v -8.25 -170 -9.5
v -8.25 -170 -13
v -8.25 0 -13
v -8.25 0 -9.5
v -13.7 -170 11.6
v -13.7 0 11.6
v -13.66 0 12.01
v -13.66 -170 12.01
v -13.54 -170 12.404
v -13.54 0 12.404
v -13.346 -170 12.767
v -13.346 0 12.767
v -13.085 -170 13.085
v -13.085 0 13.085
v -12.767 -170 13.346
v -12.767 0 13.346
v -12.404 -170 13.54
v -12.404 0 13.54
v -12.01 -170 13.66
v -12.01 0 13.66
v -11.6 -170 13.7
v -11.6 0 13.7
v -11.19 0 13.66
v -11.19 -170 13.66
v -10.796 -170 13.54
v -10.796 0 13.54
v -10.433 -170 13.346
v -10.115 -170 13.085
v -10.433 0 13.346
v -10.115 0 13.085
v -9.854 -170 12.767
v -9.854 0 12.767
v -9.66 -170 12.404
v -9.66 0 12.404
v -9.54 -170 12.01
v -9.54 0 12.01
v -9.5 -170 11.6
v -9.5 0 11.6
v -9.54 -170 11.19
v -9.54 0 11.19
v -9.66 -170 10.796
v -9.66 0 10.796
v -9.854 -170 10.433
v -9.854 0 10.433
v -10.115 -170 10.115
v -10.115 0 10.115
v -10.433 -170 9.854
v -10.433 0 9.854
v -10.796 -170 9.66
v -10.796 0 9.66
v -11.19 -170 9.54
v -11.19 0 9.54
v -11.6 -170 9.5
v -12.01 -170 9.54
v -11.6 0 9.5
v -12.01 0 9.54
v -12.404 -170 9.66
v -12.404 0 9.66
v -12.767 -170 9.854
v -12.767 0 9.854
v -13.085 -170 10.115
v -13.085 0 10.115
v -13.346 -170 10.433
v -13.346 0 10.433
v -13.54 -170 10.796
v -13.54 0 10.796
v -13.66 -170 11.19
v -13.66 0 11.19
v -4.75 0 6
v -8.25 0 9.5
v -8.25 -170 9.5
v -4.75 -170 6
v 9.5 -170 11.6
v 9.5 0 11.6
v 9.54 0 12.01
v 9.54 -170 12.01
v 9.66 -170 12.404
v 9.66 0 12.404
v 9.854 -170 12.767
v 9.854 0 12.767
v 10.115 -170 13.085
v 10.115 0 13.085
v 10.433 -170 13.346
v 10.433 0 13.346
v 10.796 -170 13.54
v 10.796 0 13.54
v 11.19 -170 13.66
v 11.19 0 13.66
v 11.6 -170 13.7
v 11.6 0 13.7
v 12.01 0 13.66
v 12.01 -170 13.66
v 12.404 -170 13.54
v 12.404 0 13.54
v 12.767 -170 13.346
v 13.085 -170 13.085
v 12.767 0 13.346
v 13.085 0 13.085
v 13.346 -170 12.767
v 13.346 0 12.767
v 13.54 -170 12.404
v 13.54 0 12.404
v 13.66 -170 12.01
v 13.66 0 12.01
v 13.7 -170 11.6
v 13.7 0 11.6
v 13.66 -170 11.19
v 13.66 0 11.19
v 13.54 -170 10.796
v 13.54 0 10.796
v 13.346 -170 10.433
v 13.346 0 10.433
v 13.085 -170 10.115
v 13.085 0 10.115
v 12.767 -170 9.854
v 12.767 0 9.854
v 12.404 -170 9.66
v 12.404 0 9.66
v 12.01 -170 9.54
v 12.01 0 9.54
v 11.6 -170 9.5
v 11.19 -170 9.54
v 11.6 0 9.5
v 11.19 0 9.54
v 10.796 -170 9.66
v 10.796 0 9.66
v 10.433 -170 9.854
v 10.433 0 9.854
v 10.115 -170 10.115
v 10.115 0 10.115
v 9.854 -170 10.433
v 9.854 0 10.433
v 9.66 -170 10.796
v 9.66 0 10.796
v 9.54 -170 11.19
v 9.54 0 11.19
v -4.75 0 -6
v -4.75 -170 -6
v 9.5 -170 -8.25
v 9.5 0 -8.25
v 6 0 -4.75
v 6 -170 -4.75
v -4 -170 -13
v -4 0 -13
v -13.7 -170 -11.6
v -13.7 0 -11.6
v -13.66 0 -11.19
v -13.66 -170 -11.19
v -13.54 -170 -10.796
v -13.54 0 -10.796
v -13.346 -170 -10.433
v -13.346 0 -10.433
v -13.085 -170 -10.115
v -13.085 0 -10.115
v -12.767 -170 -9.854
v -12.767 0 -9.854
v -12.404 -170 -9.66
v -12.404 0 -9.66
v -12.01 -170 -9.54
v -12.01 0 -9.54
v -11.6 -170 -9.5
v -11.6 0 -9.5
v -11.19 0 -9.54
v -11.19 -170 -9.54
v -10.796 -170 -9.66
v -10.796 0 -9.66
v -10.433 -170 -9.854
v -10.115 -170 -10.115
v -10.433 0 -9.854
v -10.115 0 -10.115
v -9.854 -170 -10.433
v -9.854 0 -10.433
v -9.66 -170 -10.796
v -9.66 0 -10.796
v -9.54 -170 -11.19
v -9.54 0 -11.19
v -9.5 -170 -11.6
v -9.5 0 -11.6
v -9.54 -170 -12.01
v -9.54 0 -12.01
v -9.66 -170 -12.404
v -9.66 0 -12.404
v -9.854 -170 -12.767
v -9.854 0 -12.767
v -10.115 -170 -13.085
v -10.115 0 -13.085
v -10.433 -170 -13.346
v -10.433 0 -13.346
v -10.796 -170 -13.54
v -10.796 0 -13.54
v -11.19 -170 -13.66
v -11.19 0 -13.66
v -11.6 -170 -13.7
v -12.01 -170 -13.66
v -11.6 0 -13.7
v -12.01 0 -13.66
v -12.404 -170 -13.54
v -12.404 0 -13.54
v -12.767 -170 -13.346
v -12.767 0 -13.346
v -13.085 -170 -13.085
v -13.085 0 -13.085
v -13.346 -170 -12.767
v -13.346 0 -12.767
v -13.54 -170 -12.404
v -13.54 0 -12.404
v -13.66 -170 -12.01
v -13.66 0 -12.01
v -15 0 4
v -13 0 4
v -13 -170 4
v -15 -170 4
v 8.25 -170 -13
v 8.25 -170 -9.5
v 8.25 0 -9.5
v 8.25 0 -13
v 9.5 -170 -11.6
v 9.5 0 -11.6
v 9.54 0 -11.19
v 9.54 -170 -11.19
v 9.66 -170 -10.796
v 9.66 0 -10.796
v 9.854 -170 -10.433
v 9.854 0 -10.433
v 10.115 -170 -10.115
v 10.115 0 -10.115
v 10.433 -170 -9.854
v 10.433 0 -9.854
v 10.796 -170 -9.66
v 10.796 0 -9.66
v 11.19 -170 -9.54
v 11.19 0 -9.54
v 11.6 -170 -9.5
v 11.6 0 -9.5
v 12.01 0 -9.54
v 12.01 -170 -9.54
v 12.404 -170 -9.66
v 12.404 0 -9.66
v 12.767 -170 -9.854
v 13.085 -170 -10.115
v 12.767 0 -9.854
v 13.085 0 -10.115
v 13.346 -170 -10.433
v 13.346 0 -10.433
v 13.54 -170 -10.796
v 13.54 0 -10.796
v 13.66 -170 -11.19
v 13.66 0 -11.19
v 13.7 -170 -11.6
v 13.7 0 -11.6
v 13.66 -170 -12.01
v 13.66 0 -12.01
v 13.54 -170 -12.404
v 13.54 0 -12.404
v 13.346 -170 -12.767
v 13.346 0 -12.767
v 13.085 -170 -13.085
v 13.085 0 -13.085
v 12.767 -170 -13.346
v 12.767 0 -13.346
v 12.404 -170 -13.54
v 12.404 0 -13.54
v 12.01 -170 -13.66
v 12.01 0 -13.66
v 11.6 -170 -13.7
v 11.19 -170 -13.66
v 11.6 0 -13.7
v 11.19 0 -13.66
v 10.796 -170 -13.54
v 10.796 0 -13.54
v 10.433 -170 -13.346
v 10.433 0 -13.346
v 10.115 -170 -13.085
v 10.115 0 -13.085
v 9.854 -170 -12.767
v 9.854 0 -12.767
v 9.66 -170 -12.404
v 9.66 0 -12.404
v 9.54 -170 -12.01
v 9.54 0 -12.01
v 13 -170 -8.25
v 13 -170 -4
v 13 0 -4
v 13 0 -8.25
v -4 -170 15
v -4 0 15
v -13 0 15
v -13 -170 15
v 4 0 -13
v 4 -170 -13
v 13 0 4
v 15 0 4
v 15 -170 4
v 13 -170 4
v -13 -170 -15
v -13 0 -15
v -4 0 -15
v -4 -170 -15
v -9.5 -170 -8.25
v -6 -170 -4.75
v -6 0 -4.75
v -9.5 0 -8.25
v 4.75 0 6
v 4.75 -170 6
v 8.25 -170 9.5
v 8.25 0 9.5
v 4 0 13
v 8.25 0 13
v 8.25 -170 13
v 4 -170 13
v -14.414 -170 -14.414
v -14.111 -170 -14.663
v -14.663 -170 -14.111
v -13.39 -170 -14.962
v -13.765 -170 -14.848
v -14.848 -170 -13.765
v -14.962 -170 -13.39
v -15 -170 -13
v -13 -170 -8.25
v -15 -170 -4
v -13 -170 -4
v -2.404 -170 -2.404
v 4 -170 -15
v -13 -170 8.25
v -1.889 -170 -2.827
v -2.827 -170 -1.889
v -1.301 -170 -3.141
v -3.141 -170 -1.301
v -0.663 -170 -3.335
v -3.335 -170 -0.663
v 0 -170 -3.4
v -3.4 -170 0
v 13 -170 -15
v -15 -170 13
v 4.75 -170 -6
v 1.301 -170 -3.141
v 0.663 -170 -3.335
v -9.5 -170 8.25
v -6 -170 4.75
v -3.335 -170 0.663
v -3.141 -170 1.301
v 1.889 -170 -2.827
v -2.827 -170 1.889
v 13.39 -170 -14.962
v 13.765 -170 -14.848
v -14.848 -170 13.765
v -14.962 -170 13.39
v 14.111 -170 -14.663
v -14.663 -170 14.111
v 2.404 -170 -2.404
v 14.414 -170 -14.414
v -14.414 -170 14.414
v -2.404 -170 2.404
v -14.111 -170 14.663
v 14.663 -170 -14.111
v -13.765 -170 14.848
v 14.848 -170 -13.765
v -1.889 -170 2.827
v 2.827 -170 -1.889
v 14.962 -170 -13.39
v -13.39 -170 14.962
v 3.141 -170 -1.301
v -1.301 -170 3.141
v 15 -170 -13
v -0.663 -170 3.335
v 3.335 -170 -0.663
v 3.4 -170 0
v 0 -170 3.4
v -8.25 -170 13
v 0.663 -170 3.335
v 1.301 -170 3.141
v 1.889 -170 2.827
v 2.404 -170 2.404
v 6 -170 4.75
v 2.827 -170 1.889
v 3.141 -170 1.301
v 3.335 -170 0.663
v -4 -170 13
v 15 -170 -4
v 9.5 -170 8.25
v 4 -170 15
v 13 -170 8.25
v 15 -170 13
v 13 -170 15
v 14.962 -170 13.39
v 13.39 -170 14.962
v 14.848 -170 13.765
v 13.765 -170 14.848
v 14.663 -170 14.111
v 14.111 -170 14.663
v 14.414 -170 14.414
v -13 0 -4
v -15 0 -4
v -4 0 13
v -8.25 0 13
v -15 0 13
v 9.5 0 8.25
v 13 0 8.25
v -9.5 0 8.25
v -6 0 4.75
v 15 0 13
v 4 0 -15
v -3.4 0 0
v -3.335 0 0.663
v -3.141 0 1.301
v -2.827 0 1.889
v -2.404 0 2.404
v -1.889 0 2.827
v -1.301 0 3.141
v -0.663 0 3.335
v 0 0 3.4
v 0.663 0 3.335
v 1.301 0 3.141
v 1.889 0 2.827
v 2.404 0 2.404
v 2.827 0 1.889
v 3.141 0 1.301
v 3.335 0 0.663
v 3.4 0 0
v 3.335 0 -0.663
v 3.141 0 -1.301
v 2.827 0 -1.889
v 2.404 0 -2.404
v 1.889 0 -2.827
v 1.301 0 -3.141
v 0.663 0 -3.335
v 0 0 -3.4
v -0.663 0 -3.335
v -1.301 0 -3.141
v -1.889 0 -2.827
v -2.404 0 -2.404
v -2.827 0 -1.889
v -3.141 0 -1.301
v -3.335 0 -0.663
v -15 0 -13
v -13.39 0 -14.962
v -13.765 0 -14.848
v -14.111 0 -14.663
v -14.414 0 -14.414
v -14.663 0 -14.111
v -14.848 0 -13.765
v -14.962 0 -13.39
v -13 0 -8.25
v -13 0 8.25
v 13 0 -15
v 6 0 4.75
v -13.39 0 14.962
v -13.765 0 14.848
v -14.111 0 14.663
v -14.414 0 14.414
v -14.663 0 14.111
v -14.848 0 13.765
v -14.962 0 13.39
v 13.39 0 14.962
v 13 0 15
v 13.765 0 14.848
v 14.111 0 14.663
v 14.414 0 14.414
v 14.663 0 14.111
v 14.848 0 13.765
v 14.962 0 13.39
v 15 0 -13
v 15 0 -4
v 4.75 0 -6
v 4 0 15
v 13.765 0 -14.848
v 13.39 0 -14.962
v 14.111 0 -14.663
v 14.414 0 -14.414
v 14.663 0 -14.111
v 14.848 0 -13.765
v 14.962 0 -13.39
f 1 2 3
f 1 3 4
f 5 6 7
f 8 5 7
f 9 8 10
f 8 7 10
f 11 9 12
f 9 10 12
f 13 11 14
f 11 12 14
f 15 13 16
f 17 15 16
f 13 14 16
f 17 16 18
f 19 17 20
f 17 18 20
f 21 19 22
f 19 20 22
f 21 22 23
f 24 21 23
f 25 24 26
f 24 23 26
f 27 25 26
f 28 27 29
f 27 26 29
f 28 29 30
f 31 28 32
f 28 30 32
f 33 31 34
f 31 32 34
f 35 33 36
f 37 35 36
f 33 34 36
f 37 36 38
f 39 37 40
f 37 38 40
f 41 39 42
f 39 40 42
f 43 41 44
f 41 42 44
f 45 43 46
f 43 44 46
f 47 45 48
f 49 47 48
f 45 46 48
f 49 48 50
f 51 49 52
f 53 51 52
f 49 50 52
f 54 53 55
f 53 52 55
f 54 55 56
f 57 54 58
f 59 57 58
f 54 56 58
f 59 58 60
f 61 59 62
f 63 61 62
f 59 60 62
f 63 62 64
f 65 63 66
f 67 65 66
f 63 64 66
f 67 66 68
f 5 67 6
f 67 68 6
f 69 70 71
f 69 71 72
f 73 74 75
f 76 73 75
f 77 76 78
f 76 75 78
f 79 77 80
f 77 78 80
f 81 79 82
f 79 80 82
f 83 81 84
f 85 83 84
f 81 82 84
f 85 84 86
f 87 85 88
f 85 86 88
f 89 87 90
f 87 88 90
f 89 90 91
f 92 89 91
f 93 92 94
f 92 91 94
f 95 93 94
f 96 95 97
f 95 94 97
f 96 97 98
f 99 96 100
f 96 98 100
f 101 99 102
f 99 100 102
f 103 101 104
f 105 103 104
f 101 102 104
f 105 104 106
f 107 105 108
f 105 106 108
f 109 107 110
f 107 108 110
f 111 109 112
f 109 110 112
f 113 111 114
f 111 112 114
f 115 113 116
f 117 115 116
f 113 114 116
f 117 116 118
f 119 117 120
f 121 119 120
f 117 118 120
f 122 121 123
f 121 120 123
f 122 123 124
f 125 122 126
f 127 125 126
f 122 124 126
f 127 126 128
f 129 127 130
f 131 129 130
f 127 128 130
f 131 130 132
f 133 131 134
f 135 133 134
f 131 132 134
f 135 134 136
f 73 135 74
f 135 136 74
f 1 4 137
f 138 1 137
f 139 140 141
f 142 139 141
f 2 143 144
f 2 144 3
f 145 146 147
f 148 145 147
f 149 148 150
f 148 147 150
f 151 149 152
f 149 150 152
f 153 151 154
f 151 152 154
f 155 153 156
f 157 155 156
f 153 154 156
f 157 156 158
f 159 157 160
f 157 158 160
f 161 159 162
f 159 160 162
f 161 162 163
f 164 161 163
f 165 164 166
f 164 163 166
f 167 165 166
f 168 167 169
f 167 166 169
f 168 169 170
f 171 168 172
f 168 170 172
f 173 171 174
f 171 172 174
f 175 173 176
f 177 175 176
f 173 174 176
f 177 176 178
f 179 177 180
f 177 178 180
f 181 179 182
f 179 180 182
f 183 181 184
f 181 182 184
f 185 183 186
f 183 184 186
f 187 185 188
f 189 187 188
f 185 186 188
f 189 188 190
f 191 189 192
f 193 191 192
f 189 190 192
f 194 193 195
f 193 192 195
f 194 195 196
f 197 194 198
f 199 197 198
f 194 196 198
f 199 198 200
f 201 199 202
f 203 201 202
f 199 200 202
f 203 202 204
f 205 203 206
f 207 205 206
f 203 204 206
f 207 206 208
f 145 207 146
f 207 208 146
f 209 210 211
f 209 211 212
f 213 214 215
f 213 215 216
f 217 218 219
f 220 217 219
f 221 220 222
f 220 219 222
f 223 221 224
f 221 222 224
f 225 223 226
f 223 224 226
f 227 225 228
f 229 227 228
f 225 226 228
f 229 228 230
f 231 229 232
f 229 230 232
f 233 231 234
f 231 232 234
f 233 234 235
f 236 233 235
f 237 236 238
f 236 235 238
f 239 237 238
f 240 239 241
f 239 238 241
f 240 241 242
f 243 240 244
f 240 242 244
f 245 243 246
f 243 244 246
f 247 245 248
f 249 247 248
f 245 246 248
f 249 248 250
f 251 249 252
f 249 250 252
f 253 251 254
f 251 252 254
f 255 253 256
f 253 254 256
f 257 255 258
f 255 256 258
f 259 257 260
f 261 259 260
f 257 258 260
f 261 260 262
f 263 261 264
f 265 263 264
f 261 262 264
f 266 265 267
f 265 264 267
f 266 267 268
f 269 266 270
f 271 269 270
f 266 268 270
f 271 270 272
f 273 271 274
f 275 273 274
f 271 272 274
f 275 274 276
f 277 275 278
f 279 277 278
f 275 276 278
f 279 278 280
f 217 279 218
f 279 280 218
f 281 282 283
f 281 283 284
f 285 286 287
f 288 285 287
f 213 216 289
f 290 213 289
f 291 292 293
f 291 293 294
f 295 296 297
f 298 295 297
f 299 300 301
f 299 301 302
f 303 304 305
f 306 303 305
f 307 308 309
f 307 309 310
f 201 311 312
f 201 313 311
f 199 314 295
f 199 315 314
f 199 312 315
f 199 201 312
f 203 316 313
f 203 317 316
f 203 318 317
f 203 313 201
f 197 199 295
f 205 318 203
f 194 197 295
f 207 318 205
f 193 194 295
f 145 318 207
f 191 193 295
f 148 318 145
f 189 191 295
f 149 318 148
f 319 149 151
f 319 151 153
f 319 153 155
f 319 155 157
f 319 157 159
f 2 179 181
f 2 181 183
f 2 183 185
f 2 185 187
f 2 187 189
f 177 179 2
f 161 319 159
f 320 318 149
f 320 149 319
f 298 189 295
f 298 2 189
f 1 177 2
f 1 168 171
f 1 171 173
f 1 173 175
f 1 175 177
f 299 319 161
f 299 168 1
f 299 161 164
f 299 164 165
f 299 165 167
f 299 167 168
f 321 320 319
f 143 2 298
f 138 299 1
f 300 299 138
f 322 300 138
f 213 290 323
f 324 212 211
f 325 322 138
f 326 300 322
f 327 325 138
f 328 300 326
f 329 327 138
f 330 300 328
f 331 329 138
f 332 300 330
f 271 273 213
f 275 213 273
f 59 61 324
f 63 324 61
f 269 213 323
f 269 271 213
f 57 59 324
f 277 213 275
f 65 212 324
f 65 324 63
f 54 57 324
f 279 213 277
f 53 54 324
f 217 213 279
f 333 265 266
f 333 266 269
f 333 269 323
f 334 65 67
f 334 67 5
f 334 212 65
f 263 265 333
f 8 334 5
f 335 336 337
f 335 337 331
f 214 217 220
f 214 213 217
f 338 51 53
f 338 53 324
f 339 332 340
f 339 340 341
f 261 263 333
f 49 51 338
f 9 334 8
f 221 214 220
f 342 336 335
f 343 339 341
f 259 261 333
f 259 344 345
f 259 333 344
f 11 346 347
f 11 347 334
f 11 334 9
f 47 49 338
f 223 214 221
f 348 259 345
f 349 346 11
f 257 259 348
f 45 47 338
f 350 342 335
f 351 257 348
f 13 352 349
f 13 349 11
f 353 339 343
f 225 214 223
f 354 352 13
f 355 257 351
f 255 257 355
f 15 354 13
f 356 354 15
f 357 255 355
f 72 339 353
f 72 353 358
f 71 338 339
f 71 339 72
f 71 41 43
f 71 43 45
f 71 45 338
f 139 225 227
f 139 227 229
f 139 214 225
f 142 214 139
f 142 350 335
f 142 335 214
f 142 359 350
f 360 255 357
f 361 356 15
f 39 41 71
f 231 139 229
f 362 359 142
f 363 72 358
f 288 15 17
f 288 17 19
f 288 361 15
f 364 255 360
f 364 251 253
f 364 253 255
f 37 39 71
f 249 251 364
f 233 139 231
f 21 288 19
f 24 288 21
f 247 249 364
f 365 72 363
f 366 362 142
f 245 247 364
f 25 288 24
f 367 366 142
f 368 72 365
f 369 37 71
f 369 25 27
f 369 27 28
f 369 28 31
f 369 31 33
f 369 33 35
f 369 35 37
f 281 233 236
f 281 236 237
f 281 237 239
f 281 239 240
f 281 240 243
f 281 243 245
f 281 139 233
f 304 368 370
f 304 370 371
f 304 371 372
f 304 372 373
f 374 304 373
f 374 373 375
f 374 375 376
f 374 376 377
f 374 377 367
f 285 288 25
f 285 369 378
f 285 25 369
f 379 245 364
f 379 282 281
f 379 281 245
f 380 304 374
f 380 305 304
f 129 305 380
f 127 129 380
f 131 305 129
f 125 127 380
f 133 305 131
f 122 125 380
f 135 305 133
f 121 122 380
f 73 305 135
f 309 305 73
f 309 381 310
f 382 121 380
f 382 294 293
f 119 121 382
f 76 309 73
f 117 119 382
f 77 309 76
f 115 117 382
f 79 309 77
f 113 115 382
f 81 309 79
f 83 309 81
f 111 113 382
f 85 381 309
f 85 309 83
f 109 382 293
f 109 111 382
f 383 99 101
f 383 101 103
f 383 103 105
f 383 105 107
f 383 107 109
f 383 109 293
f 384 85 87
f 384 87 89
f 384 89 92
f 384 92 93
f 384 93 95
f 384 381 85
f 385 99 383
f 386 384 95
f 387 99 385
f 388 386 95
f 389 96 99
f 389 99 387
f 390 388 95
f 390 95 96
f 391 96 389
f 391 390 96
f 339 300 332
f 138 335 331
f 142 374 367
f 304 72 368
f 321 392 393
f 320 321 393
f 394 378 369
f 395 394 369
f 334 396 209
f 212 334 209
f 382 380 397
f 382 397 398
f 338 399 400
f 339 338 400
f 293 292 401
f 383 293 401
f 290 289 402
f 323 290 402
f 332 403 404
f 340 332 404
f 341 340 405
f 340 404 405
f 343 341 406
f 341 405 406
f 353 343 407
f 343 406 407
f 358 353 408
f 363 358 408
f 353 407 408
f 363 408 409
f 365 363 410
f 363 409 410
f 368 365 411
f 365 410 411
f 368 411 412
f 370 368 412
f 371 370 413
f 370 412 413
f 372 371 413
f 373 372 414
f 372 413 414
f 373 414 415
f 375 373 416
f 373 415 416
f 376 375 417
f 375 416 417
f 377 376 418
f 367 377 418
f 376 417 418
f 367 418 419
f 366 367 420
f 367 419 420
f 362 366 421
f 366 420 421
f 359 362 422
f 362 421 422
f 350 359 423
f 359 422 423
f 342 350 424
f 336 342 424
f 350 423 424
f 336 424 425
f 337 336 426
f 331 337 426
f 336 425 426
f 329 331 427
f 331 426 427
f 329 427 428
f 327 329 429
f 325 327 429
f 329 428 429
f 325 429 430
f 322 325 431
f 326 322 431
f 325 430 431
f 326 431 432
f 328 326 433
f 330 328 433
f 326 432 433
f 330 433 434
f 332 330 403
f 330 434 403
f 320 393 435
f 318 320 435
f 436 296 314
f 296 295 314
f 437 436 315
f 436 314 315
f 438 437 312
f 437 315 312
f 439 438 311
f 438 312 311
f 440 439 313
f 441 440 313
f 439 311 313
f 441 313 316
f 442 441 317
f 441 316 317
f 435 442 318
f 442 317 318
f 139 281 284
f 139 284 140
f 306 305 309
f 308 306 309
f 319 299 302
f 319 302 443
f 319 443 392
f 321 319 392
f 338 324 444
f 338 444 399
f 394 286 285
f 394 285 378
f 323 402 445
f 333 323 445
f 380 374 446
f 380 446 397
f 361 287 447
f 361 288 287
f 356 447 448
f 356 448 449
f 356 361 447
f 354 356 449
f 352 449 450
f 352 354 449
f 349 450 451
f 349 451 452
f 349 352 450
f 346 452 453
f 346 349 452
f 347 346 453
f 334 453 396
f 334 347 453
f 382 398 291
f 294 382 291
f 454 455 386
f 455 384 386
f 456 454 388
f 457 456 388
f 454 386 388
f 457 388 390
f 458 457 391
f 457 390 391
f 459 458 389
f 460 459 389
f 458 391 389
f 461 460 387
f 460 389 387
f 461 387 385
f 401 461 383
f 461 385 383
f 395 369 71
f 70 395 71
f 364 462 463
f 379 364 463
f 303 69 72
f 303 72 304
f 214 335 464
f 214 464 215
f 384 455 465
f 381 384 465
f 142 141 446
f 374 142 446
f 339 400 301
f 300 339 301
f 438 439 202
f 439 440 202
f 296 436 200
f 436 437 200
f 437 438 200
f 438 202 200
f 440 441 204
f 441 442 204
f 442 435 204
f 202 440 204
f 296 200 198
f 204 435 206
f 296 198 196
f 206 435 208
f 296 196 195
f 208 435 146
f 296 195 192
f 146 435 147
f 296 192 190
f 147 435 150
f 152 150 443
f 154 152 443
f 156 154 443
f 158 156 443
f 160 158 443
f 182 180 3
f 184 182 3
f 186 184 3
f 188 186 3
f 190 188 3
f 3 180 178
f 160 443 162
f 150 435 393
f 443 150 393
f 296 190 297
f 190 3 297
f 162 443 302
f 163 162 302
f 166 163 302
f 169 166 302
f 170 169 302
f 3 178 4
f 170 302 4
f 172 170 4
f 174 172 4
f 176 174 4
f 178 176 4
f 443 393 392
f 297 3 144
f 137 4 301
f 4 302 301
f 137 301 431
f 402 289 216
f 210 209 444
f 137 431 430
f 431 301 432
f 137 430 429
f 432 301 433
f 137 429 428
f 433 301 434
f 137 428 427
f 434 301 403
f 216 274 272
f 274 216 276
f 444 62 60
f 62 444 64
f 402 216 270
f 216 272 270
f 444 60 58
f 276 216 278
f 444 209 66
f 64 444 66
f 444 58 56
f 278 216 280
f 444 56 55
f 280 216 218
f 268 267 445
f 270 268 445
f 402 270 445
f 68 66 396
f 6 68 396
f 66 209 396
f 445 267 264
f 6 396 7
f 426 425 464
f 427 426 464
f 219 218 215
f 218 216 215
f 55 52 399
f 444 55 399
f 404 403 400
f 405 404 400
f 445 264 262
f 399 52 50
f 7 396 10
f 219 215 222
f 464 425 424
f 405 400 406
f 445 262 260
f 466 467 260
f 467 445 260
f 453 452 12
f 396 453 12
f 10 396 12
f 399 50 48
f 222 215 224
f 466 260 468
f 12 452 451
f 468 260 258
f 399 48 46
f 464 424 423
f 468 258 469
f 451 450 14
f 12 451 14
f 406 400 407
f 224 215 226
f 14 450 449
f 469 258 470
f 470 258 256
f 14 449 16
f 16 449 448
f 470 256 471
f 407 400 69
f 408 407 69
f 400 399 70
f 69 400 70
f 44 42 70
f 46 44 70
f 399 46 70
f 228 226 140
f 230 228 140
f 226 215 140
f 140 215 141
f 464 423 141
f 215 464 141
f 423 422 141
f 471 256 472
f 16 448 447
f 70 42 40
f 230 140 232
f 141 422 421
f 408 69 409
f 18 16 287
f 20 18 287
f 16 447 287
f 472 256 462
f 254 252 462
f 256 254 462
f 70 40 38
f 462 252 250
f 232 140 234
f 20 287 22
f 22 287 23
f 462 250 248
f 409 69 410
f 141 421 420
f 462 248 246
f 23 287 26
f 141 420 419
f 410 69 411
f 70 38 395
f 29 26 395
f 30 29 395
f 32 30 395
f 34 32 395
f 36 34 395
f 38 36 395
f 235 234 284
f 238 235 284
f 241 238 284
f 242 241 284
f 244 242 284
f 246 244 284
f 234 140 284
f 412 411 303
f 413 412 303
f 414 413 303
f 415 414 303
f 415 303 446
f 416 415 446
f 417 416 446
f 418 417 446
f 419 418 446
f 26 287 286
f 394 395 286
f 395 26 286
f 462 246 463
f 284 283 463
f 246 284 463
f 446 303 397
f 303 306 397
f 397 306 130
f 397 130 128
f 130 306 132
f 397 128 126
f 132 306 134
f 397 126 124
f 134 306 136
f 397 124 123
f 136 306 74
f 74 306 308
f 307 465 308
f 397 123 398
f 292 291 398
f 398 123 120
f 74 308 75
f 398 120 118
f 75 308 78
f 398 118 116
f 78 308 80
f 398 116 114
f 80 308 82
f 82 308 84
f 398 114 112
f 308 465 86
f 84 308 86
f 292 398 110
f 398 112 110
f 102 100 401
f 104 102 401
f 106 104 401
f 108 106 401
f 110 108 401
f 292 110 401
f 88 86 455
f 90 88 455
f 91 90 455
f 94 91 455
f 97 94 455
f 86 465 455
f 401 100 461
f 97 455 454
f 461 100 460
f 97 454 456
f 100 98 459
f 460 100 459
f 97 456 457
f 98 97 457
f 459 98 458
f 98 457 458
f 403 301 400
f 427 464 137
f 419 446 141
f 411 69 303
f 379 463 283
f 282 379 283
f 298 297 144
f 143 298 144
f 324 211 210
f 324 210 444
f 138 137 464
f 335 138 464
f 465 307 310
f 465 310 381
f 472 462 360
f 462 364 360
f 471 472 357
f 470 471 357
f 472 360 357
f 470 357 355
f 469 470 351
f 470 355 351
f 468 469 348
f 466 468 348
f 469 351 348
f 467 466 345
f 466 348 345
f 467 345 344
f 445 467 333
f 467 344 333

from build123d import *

# Parameters (mm, degrees)
F1_DEPTH = 170
F2_DEPTH = 400
F3_W     = 18.6485039899
F3_H     = 8
F3_W_2   = 19.9612321942
F3_R     = 3.4
F3_R_2   = 2.1
F4_DEPTH = 170
F5_R     = 2


# Not quite as in the source:
# - a pattern or mirror of a feature is missing from the dataset's text; its kind, count and spacing are read off the source's solid


with BuildPart() as f1:
    # F0 (on Front) → F1 (new body)
    with BuildSketch(Plane.XZ):
        Polygon((15, -15), (15, 15), (4, 15), (4, 13), (8.25, 13), (8.25, 9.5), (4.75, 6), (-4.75, 6), (-8.25, 9.5), (-8.25, 13), (-4, 13), (-4, 15), (-15, 15), (-15, -15), align=None)
        Polygon((4, 13), (4, 15), (-4, 15), (-4, 13), (-8.25, 13), (-8.25, 9.5), (-4.75, 6), (4.75, 6), (8.25, 9.5), (8.25, 13), align=None)
    extrude(amount=F1_DEPTH)

    # F0 (on Front) → F2 (cut)
    with BuildSketch(Plane.XZ):
        Polygon((4, 13), (4, 15), (-4, 15), (-4, 13), (-8.25, 13), (-8.25, 9.5), (-4.75, 6), (4.75, 6), (8.25, 9.5), (8.25, 13), align=None)
    f2 = extrude(amount=F2_DEPTH, mode=Mode.SUBTRACT)

    # F2_copies: F2 across plane
    add(f2.mirror(Plane(origin=(0, 0, 0), x_dir=(-1, 0, 0), z_dir=(0, 0, -1))), mode=Mode.SUBTRACT)

    # F3 (on face) → F4 (cut)
    with BuildSketch(Plane(origin=(0, 0, 0), x_dir=(-1, 0, 0), z_dir=(0, 1, 0))):
        Polygon((-6, 4.75), (-9.5, 8.25), (-13, 8.25), (-13, 4), (-13, -4), (-13, -8.25), (-9.5, -8.25), (-6, -4.75), align=None)
        with Locations((-22.3242519949, 0)):
            Rectangle(F3_W, F3_H)
        Polygon((13, 8.25), (9.5, 8.25), (6, 4.75), (6, -4.75), (9.5, -8.25), (13, -8.25), (13, -4), (13, 4), align=None)
        with Locations((22.9806160971, 0)):
            Rectangle(F3_W_2, F3_H)
        Circle(F3_R)
        with Locations((-11.6, 11.6)):
            Circle(F3_R_2)
        with Locations((-11.6, -11.6)):
            Circle(F3_R_2)
        with Locations((11.6, -11.6)):
            Circle(F3_R_2)
        with Locations((11.6, 11.6)):
            Circle(F3_R_2)
    extrude(amount=-F4_DEPTH, mode=Mode.SUBTRACT)

    # F5
    f5_edges = [f1.edges().sort_by_distance(p)[0] for p in [
        (-15, -85, 15),
        (-15, -85, -15),
        (15, -85, -15),
        (15, -85, 15),
    ]]
    fillet(f5_edges, radius=F5_R)


solid = f1.part
